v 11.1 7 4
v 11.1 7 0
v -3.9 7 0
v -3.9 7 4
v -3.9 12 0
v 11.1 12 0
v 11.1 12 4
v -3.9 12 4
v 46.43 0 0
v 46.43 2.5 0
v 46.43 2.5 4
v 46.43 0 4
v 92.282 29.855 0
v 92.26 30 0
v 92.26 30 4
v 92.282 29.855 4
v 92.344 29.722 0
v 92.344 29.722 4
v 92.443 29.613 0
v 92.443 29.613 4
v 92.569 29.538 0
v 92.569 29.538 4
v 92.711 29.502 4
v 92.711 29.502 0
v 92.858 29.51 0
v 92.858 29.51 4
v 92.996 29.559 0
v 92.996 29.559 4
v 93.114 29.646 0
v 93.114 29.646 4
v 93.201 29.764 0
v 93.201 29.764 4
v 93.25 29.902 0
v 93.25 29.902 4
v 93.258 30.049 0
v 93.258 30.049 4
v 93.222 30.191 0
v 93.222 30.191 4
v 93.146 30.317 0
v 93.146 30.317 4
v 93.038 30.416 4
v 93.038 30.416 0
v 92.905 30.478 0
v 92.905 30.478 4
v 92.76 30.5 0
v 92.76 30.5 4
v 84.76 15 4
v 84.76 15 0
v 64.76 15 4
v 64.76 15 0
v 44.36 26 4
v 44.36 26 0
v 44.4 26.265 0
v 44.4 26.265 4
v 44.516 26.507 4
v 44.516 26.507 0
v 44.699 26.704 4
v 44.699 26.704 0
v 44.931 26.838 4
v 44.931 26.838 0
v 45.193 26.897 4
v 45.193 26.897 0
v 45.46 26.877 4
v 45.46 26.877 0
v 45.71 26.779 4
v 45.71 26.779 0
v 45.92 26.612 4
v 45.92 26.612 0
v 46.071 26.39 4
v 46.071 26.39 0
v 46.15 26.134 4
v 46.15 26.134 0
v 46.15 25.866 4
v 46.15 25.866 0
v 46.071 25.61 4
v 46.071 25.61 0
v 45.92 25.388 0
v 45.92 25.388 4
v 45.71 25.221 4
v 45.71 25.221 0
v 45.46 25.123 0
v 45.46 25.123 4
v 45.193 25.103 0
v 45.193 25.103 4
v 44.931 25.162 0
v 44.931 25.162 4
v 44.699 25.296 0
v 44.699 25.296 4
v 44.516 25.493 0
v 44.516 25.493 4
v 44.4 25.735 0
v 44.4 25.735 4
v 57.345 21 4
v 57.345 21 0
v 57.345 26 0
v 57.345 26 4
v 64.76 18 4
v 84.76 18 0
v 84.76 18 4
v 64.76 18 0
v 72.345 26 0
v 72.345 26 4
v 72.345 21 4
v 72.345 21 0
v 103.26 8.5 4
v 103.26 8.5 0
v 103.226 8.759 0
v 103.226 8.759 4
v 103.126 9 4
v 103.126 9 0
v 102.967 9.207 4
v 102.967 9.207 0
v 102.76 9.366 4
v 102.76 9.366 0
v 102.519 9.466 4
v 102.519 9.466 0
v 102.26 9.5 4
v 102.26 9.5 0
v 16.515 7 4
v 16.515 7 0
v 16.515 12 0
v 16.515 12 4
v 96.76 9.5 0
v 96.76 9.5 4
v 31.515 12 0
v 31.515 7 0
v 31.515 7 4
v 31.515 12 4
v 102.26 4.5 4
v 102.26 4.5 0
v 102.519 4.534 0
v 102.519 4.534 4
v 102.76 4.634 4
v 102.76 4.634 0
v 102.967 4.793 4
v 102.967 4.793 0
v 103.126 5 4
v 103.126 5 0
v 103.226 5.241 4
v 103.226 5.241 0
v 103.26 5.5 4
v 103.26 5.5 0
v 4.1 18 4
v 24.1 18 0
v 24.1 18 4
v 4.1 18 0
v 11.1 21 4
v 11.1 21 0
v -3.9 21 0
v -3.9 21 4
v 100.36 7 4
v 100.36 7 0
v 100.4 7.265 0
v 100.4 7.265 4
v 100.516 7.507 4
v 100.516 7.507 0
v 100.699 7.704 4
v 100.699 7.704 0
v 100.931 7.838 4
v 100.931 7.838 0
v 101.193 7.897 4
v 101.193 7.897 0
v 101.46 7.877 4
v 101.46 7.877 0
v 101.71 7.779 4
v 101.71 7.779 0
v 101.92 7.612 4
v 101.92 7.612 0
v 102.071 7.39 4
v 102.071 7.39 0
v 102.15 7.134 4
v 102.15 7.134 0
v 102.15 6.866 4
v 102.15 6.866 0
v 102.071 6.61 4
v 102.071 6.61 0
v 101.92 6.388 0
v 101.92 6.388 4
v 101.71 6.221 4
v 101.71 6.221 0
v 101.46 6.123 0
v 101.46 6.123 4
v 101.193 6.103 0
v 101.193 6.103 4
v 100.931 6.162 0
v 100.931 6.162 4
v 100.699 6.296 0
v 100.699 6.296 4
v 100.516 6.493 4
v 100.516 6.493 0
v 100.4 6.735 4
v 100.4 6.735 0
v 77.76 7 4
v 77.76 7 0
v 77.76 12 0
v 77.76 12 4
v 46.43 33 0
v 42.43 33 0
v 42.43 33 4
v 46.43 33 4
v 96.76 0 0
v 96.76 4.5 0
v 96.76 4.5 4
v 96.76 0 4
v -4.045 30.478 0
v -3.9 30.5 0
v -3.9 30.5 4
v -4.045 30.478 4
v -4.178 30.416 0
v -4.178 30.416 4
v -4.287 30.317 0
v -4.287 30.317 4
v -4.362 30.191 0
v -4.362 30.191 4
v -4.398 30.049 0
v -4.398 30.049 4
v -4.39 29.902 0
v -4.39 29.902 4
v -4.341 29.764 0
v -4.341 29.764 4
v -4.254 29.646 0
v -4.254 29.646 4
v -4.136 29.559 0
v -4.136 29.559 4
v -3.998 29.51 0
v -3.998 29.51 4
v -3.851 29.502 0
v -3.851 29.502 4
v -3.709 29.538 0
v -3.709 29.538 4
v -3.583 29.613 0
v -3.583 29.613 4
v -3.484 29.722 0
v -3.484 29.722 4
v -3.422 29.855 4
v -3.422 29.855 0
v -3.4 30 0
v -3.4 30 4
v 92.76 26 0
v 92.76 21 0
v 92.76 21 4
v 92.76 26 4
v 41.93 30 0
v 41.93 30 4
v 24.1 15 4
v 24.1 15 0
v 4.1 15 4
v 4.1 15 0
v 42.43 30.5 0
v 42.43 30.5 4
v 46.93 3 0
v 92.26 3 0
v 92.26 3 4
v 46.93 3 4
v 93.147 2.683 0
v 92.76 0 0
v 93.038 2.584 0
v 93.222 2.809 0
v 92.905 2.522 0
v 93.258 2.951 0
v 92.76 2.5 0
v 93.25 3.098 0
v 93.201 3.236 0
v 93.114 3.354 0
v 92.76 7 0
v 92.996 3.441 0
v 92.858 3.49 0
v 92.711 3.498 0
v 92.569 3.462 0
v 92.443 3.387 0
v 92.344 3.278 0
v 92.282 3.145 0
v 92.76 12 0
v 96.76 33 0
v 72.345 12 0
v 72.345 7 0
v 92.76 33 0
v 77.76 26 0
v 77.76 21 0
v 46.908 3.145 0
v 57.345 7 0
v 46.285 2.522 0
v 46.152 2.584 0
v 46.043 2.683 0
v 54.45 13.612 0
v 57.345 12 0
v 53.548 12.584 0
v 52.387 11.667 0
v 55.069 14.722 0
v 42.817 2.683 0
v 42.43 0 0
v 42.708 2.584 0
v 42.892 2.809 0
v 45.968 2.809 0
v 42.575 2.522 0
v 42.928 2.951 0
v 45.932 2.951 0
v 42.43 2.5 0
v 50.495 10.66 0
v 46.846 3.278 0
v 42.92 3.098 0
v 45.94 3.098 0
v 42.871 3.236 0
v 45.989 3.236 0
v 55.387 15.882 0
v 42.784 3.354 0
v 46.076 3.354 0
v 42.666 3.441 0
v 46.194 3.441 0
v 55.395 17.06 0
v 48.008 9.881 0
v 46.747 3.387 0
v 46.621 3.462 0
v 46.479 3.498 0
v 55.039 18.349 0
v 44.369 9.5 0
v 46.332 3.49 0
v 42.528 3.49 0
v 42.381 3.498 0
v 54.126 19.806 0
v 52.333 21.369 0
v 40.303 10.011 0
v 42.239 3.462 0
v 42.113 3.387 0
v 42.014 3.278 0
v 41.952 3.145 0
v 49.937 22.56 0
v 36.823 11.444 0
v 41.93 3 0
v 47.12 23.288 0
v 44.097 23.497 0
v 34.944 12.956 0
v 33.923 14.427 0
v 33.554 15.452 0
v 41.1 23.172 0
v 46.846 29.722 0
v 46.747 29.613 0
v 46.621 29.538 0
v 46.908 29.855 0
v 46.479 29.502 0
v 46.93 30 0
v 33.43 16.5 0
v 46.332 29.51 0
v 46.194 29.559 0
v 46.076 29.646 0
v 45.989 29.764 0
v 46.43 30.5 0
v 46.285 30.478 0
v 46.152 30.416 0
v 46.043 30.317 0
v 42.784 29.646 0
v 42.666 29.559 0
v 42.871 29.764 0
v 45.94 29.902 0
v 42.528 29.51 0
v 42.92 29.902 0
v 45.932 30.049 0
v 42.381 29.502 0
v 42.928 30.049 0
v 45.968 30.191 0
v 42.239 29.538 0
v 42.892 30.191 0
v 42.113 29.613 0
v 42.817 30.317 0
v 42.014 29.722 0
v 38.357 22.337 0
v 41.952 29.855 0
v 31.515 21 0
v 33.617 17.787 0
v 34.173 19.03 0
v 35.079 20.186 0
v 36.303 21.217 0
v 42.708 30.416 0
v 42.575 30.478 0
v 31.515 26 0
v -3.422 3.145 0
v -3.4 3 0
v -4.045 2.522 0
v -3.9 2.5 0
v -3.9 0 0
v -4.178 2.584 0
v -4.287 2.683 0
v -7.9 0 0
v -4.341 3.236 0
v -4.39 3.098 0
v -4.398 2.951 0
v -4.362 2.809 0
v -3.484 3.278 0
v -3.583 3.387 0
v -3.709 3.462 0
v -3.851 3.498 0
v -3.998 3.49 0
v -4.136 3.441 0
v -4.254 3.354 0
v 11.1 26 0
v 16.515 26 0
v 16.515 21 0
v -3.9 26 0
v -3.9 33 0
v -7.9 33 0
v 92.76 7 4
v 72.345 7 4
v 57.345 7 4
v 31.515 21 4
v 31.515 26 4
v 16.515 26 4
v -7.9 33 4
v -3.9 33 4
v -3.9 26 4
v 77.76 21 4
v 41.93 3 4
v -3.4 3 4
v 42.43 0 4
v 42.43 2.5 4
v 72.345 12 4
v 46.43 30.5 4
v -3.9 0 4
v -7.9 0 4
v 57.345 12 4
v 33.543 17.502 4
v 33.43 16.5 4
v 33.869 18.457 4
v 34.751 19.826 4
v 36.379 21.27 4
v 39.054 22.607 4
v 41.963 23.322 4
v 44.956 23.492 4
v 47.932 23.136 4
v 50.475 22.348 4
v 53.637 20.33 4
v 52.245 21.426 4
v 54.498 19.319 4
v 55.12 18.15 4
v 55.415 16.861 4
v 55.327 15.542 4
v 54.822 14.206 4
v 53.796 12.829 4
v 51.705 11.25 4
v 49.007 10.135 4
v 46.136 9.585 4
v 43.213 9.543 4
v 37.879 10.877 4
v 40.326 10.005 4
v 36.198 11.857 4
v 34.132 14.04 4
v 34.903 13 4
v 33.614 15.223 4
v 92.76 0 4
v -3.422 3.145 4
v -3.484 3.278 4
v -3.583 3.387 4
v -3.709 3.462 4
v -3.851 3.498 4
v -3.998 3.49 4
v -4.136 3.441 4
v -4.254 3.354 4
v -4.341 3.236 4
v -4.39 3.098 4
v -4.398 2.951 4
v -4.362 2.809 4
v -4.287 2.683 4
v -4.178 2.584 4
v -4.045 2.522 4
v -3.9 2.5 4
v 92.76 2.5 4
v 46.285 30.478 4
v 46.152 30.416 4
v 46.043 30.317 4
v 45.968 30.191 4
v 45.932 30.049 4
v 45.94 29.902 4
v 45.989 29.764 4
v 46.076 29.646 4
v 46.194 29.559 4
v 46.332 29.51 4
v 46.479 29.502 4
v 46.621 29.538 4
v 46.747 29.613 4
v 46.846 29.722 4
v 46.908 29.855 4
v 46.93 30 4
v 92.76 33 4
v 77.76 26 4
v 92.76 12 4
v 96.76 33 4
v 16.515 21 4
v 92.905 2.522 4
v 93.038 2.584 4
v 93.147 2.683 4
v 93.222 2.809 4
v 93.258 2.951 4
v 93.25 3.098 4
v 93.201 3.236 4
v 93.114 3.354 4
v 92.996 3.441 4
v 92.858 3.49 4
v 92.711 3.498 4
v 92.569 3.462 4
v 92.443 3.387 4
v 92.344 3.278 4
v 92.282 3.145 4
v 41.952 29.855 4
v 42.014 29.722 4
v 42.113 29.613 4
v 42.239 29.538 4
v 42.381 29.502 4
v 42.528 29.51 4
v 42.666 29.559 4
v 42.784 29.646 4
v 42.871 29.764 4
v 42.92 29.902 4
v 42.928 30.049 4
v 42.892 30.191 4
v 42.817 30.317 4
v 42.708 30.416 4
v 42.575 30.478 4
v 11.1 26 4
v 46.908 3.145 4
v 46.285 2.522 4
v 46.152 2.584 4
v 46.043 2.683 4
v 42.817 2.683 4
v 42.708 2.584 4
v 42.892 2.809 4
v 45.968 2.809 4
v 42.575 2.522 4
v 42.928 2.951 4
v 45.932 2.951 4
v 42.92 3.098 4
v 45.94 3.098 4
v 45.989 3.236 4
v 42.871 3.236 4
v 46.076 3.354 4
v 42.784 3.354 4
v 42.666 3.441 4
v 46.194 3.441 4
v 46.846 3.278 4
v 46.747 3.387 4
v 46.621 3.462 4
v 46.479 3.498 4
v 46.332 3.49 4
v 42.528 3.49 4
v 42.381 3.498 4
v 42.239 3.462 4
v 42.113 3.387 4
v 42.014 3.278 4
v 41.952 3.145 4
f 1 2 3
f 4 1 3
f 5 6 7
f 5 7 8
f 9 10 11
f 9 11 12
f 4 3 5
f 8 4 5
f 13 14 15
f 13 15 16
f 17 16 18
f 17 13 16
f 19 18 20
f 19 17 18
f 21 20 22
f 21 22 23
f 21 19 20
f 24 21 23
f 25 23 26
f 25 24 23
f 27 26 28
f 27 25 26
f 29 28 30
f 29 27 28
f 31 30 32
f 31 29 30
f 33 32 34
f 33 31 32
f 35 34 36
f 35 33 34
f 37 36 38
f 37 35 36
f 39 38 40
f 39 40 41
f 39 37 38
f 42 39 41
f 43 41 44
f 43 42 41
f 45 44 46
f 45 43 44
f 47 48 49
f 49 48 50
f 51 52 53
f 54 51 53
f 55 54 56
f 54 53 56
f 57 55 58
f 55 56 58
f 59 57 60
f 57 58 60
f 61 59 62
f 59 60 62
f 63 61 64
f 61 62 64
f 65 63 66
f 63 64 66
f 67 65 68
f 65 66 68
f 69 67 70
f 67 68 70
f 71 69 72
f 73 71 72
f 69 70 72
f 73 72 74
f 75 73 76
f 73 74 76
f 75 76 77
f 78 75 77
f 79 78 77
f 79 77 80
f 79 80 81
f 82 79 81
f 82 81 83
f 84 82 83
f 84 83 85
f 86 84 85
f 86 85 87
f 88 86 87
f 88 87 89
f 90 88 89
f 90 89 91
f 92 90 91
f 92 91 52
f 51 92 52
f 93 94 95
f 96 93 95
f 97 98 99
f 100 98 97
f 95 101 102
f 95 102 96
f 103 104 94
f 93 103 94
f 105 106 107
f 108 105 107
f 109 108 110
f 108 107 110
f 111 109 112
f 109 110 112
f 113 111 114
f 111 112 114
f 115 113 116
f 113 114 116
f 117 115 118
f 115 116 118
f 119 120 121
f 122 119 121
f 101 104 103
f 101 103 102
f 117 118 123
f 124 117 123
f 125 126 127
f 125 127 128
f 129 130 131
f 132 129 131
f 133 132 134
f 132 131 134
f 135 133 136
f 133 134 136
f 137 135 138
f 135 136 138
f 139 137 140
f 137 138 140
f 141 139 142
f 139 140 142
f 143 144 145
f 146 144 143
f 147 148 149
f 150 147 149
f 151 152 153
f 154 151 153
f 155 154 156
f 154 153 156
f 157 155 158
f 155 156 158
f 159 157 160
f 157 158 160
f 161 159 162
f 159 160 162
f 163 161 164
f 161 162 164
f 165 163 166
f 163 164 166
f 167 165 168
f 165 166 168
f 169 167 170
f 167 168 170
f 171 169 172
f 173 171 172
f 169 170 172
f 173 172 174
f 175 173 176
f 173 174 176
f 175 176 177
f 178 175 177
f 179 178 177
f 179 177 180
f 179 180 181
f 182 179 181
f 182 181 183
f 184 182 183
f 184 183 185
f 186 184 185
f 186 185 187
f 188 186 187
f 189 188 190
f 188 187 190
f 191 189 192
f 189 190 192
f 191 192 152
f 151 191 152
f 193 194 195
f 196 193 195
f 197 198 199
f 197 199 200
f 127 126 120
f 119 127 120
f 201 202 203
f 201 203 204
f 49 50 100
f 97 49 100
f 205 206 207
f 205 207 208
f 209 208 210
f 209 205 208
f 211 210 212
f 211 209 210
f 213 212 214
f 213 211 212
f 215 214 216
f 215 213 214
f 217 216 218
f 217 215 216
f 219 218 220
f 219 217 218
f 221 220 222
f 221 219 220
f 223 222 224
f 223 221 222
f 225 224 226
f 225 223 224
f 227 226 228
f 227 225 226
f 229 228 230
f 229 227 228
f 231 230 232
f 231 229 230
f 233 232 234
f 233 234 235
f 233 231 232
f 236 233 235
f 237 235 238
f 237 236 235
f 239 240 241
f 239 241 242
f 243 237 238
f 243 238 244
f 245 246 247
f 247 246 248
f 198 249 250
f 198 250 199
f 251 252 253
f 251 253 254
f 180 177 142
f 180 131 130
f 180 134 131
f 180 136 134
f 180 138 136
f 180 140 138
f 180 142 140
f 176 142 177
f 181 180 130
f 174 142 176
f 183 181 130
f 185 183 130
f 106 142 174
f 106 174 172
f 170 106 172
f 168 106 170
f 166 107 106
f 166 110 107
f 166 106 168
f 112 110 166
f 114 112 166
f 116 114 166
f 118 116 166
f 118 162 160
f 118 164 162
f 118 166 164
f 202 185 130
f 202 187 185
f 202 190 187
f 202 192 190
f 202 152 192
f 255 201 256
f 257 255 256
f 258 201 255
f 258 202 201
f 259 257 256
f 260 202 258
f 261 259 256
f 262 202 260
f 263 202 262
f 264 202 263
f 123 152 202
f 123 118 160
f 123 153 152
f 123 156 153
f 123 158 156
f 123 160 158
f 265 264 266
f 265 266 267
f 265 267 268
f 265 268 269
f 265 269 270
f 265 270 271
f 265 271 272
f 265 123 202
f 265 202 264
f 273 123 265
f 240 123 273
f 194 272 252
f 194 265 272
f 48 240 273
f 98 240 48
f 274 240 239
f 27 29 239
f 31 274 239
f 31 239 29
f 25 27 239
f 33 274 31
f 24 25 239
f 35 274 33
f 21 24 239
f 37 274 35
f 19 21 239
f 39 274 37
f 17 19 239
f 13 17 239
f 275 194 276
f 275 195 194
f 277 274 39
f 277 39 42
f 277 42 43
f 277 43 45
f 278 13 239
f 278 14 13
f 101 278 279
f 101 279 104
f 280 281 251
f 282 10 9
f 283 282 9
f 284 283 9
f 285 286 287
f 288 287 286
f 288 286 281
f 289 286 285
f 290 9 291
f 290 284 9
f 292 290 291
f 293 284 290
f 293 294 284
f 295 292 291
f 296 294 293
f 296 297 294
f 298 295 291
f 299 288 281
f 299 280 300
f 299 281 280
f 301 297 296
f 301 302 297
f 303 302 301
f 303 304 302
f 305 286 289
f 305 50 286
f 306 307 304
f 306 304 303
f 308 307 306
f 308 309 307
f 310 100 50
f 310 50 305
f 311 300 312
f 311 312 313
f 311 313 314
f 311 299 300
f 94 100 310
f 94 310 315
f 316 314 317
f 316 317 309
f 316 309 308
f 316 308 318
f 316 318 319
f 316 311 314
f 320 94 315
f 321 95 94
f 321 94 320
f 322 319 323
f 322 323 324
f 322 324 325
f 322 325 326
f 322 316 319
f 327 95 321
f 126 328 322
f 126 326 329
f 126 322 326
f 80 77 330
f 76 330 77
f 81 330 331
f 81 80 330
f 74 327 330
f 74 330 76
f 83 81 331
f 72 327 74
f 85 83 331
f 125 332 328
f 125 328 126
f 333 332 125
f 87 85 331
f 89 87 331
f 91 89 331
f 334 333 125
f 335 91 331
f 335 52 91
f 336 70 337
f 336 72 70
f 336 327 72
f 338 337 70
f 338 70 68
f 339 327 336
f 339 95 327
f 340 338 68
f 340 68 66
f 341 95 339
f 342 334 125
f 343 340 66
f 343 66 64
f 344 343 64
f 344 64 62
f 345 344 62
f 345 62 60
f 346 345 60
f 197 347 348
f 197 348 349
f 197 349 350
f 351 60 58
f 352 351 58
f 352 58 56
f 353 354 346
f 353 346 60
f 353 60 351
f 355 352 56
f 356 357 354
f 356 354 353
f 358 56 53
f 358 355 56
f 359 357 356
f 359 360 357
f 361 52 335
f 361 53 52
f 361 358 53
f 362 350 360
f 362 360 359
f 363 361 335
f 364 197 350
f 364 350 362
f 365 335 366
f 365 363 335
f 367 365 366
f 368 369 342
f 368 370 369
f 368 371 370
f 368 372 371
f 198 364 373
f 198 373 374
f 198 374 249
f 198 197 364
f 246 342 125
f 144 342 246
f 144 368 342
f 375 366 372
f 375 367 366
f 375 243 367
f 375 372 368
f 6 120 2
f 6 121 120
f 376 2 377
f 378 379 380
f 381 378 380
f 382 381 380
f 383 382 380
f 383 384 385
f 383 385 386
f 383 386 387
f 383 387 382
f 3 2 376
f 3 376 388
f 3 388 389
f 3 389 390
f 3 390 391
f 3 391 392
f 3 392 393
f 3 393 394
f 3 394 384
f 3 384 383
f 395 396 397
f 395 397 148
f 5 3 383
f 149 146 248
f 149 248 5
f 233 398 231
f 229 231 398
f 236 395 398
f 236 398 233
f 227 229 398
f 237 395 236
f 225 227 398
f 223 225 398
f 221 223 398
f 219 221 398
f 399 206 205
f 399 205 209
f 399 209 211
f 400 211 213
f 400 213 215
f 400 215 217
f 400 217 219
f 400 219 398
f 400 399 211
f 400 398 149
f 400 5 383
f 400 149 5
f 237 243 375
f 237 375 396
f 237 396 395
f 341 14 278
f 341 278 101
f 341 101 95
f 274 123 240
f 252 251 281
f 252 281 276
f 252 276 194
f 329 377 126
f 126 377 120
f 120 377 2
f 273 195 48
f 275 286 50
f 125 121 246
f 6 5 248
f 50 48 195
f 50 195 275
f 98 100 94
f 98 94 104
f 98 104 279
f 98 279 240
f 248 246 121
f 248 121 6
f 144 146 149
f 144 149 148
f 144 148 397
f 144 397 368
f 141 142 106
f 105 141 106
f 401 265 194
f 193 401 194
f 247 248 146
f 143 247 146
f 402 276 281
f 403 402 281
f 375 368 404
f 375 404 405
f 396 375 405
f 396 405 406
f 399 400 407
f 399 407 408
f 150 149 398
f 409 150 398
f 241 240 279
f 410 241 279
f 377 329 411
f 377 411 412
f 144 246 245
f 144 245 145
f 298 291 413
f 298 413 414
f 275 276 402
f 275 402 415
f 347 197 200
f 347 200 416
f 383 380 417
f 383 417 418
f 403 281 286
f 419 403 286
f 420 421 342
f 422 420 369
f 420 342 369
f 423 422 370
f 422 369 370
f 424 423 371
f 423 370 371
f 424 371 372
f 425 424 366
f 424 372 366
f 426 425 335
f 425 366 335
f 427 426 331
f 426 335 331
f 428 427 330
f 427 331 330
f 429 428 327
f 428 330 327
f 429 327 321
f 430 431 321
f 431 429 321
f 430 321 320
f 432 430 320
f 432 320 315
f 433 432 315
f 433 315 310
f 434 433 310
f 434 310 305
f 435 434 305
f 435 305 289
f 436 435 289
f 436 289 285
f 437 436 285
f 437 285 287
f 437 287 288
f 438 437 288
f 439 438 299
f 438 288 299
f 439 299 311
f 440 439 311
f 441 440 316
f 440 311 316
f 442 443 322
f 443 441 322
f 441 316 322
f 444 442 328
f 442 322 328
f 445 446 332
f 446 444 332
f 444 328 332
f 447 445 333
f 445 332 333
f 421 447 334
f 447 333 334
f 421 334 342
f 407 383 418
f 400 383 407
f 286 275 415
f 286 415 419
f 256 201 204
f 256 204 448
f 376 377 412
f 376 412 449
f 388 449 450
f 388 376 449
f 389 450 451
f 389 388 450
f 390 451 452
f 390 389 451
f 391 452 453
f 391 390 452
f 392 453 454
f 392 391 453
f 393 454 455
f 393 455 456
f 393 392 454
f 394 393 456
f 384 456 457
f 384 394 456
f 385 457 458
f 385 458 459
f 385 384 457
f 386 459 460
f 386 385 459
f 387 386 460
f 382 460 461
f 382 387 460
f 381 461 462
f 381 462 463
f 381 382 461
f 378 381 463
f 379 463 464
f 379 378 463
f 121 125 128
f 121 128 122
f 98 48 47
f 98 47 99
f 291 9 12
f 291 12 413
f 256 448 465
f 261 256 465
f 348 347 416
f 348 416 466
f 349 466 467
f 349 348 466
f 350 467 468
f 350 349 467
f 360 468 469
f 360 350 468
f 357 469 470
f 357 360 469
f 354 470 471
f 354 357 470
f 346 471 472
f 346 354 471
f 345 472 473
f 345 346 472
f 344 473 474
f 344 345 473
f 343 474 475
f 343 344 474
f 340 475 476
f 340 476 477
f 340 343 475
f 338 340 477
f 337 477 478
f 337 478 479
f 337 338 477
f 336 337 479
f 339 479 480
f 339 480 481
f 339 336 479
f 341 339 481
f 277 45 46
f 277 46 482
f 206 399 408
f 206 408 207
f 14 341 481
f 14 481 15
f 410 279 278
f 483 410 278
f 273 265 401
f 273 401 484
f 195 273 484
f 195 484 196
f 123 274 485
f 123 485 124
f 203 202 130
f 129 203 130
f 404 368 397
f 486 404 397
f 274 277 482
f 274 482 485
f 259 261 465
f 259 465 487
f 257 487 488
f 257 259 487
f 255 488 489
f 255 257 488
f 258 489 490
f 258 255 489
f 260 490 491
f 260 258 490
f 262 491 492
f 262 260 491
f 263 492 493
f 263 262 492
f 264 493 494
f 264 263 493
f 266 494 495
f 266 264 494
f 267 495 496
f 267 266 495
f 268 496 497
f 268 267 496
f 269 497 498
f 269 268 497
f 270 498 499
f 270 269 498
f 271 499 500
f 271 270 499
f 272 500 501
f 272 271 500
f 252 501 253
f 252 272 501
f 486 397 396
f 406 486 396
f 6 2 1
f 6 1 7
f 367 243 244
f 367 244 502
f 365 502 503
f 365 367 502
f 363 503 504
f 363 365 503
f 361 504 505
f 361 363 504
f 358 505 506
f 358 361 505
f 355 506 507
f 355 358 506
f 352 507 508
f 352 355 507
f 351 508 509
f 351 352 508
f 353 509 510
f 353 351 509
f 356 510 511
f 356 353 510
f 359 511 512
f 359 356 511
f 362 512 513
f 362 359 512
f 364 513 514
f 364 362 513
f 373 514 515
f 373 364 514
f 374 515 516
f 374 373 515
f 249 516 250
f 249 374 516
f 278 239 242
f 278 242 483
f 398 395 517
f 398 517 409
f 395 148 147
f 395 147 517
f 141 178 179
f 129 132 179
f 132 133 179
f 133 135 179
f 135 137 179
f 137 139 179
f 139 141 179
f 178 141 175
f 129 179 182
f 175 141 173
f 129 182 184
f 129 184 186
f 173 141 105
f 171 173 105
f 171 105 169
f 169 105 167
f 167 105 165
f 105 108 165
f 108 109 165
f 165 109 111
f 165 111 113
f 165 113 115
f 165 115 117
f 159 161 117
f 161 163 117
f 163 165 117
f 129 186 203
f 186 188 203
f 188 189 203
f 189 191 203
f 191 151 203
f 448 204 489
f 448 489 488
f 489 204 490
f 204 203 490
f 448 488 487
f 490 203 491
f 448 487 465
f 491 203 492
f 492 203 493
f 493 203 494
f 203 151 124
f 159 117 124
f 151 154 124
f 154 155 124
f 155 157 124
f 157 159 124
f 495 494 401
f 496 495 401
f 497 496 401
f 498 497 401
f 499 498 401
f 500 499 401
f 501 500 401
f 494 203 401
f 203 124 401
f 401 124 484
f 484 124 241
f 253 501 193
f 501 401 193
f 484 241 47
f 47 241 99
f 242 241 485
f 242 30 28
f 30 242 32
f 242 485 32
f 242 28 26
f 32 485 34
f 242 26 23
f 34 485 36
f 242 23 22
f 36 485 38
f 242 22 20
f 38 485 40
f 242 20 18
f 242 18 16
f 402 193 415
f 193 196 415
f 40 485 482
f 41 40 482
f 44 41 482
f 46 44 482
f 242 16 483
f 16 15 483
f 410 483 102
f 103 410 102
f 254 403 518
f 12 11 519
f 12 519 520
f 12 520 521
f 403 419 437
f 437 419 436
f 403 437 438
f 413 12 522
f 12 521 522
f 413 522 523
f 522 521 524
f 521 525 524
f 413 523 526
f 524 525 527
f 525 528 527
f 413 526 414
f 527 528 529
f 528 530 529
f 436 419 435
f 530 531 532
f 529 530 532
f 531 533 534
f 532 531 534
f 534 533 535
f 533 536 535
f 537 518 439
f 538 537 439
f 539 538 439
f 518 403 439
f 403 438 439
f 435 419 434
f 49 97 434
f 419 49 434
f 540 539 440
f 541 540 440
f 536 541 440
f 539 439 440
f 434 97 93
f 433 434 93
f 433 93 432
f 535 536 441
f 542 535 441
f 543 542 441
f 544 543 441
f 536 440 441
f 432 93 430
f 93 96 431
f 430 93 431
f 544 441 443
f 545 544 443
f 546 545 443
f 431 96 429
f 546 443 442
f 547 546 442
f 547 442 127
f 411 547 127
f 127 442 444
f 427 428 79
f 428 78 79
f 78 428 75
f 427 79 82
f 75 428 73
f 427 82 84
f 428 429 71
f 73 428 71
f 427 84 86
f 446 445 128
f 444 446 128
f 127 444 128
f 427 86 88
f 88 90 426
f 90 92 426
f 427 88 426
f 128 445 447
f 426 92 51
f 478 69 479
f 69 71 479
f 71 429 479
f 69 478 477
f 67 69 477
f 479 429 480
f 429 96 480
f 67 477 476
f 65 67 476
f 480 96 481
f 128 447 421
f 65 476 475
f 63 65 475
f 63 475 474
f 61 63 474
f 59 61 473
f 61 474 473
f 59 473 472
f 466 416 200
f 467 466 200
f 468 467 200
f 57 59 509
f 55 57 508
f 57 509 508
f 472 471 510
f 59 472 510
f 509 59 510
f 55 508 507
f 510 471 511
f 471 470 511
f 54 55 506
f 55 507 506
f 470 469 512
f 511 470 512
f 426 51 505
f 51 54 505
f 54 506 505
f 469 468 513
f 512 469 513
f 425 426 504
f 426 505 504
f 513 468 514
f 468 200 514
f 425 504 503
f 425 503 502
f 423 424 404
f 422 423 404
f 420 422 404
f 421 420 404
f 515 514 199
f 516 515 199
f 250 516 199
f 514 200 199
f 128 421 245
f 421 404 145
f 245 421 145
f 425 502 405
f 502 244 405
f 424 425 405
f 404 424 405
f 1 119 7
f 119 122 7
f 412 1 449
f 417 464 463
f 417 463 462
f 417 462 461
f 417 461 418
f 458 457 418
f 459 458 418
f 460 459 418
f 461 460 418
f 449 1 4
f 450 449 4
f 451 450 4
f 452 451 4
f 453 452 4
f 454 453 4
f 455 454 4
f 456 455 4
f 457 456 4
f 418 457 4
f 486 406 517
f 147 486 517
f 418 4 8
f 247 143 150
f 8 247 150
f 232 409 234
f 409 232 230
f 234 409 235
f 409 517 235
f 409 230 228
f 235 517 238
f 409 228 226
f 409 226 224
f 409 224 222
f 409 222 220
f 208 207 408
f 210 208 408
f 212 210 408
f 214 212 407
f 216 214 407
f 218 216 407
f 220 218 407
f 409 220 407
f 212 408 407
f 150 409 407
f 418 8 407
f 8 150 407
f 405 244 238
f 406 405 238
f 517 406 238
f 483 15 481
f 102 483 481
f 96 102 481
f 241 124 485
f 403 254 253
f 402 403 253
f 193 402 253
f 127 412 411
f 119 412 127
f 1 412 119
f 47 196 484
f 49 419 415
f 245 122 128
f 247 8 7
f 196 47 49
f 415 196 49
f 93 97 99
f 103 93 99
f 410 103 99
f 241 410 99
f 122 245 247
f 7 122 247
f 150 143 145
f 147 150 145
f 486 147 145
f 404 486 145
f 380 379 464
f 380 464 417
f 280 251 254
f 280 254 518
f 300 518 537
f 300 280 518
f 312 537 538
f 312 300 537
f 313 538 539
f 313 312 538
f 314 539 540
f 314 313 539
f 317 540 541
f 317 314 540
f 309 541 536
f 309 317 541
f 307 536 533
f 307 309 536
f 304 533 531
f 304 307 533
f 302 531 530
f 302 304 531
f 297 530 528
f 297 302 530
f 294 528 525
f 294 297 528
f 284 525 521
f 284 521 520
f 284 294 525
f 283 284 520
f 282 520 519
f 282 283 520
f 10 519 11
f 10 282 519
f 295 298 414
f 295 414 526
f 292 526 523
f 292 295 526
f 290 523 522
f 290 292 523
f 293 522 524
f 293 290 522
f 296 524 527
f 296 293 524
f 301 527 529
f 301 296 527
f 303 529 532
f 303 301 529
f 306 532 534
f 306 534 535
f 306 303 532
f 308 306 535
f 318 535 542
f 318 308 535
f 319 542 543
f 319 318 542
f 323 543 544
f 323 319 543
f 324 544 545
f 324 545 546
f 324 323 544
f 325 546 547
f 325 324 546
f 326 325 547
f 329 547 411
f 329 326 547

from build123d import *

# Parameters (mm, degrees)
EXTRUDE_2_DEPTH     = 4
SKETCH_3_R          = 0.9
EXTRUDE_3_DEPTH     = 4
SKETCH_4_R          = 0.9
CUT_EXTRUDE_1_DEPTH = 10
SKETCH_5_RX         = 11
SKETCH_5_RY         = 7
SKETCH_5_W          = 15
SKETCH_5_H          = 5
SKETCH_5_W_2        = 20
SKETCH_5_H_2        = 3
CUT_EXTRUDE_2_DEPTH = 10


with BuildPart() as part:
    # 草图2 → 凸台-拉伸2 (new body)
    with BuildSketch(Plane.XY):
        with BuildLine():
            Line((92.360003471, 3.000000026), (46.930000186, 3.000000026))
            ThreePointArc((46.930000186, 3.000000026), (46.076446818, 3.353553971), (46.429999173, 2.499999944))
            Line((46.429999173, 2.499999944), (46.429999173, 0))
            Line((46.429999173, 0), (42.429998517, 0))
            Line((42.429998517, 0), (42.429998517, 2.499999944))
            ThreePointArc((42.429998517, 2.499999944), (42.78355457, 3.35355131), (41.930001229, 3.000000026))
            Line((41.930001229, 3.000000026), (-3.49999981, 3.000000026))
            ThreePointArc((-3.49999981, 3.000000026), (-4.353553201, 3.353553417), (-3.99999981, 2.500000026))
            Line((-3.99999981, 2.500000026), (-3.99999981, 0))
            Line((-3.99999981, 0), (-8, 0))
            Line((-8, 0), (-8, 35.000000149))
            Line((-8, 35.000000149), (-3.99999981, 35.000000149))
            Line((-3.99999981, 35.000000149), (-3.99999981, 32.500000123))
            ThreePointArc((-3.99999981, 32.500000123), (-4.353553201, 31.646446732), (-3.49999981, 32.000000123))
            Line((-3.49999981, 32.000000123), (41.930001229, 32.000000123))
            ThreePointArc((41.930001229, 32.000000123), (42.78355457, 31.646448839), (42.429998517, 32.500000205))
            Line((42.429998517, 32.500000205), (42.429998517, 35.000000149))
            Line((42.429998517, 35.000000149), (46.429999173, 35.000000149))
            Line((46.429999173, 35.000000149), (46.429999173, 32.500000205))
            ThreePointArc((46.429999173, 32.500000205), (46.076446818, 31.646446178), (46.930000186, 32.000000123))
            Line((46.930000186, 32.000000123), (92.360003471, 32.000000123))
            ThreePointArc((92.360003471, 32.000000123), (93.213546668, 31.646450955), (92.8599975, 32.500000123))
            Line((92.8599975, 32.500000123), (92.8599975, 35.000000149))
            Line((92.8599975, 35.000000149), (96.85999769, 35.000000149))
            Line((96.85999769, 35.000000149), (96.85999769, 0))
            Line((96.85999769, 0), (92.8599975, 0))
            Line((92.8599975, 0), (92.8599975, 2.500000026))
            ThreePointArc((92.8599975, 2.500000026), (93.21355089, 3.353553417), (92.360003471, 3.000000026))
        make_face()
    extrude(amount=EXTRUDE_2_DEPTH)


with BuildPart() as body_2:
    # Split Bodies 1: the piece on the far side of the plane
    add(part.part)
    split(bisect_by=Plane.YZ.offset(48.429999172), keep=Keep.BOTTOM)


with BuildPart() as part_1:
    add(part.part)

    # Split Bodies 1
    split(bisect_by=Plane.YZ.offset(48.429999172), keep=Keep.TOP)


with BuildPart() as part_2:
    # Move Body 1: moved
    add(part_1.part.moved(Location((-0.1, 0, 0))))


with BuildPart() as body_3:
    # Split Bodies 2: the piece on the far side of the plane
    add(body_2.part)
    split(bisect_by=Plane(origin=(40.429998517, 0, 0), x_dir=(0, -1, 0), z_dir=(-1, 0, 0)), keep=Keep.BOTTOM)


with BuildPart() as body_2_1:
    add(body_2.part)

    # Split Bodies 2
    split(bisect_by=Plane(origin=(40.429998517, 0, 0), x_dir=(0, -1, 0), z_dir=(-1, 0, 0)), keep=Keep.TOP)


with BuildPart() as body_2_2:
    # Move Body 2: moved
    add(body_2_1.part.moved(Location((0.1, 0, 0))))


with BuildPart() as part_3:
    add(part_2.part)

    # Combine 2: union body 3, body 2
    add(body_3.part)
    add(body_2_2.part)


with BuildPart() as body_2_2_1:
    # Split Bodies 3: the piece on the far side of the plane
    add(part_3.part)
    split(bisect_by=Plane(origin=(0, 27.000000123, 0), x_dir=(1, 0, 0), z_dir=(0, 1, 0)), keep=Keep.BOTTOM)


with BuildPart() as part_4:
    add(part_3.part)

    # Split Bodies 3
    split(bisect_by=Plane(origin=(0, 27.000000123, 0), x_dir=(1, 0, 0), z_dir=(0, 1, 0)), keep=Keep.TOP)


with BuildPart() as part_5:
    # Move Body 3: moved
    add(part_4.part.moved(Location((0, -2, 0))))

    # Combine 3: union body 2 2
    add(body_2_2_1.part)

    # 草图3 → 凸台-拉伸3 (add)
    with BuildSketch(Plane(origin=(0, 0, 0), x_dir=(-1, 0, 0), z_dir=(0, 0, -1))):
        with BuildLine():
            Line((-102.25999769, 9.500000075), (-96.75999769, 9.500000075))
            Line((-96.75999769, 9.500000075), (-96.75999769, 4.500000075))
            Line((-96.75999769, 4.500000075), (-102.25999769, 4.500000074))
            ThreePointArc((-102.25999769, 4.500000074), (-102.967104471, 4.792893293), (-103.25999769, 5.500000074))
            Line((-103.25999769, 5.500000074), (-103.25999769, 8.500000075))
            ThreePointArc((-103.25999769, 8.500000075), (-102.967104471, 9.207106856), (-102.25999769, 9.500000075))
        make_face()
        with Locations((-101.25999769, 7.000000075)):
            Circle(SKETCH_3_R, mode=Mode.SUBTRACT)
    extrude(amount=-EXTRUDE_3_DEPTH)

    # 草图4 → 切除-拉伸1 (cut)
    with BuildSketch(Plane(origin=(0, 0, 0), x_dir=(-1, 0, 0), z_dir=(0, 0, -1))):
        with Locations((-45.25999769, 26.000000075)):
            Circle(SKETCH_4_R)
    extrude(amount=-CUT_EXTRUDE_1_DEPTH, mode=Mode.SUBTRACT)

    # 草图5 → 切除-拉伸2 (cut)
    with BuildSketch(Plane(origin=(0, 0, 0), x_dir=(-1, 0, 0), z_dir=(0, 0, -1))):
        with Locations((-44.429998845, 16.500000074)):
            Ellipse(SKETCH_5_RX, SKETCH_5_RY)
        with Locations((-85.25999769, 23.500000123)):
            Rectangle(SKETCH_5_W, SKETCH_5_H)
        with Locations((-64.844998267, 23.500000123)):
            Rectangle(SKETCH_5_W, SKETCH_5_H)
        with Locations((-24.014999422, 23.500000123)):
            Rectangle(SKETCH_5_W, SKETCH_5_H)
        with Locations((-3.6, 23.500000123)):
            Rectangle(SKETCH_5_W, SKETCH_5_H)
        with Locations((-3.6, 9.500000026)):
            Rectangle(SKETCH_5_W, SKETCH_5_H)
        with Locations((-24.014999422, 9.500000026)):
            Rectangle(SKETCH_5_W, SKETCH_5_H)
        with Locations((-64.844998267, 9.500000026)):
            Rectangle(SKETCH_5_W, SKETCH_5_H)
        with Locations((-85.25999769, 9.500000026)):
            Rectangle(SKETCH_5_W, SKETCH_5_H)
        with Locations((-74.75999769, 16.500000123)):
            Rectangle(SKETCH_5_W_2, SKETCH_5_H_2)
        with Locations((-14.1, 16.500000123)):
            Rectangle(SKETCH_5_W_2, SKETCH_5_H_2)
    extrude(amount=-CUT_EXTRUDE_2_DEPTH, mode=Mode.SUBTRACT)


solid = part_5.part
